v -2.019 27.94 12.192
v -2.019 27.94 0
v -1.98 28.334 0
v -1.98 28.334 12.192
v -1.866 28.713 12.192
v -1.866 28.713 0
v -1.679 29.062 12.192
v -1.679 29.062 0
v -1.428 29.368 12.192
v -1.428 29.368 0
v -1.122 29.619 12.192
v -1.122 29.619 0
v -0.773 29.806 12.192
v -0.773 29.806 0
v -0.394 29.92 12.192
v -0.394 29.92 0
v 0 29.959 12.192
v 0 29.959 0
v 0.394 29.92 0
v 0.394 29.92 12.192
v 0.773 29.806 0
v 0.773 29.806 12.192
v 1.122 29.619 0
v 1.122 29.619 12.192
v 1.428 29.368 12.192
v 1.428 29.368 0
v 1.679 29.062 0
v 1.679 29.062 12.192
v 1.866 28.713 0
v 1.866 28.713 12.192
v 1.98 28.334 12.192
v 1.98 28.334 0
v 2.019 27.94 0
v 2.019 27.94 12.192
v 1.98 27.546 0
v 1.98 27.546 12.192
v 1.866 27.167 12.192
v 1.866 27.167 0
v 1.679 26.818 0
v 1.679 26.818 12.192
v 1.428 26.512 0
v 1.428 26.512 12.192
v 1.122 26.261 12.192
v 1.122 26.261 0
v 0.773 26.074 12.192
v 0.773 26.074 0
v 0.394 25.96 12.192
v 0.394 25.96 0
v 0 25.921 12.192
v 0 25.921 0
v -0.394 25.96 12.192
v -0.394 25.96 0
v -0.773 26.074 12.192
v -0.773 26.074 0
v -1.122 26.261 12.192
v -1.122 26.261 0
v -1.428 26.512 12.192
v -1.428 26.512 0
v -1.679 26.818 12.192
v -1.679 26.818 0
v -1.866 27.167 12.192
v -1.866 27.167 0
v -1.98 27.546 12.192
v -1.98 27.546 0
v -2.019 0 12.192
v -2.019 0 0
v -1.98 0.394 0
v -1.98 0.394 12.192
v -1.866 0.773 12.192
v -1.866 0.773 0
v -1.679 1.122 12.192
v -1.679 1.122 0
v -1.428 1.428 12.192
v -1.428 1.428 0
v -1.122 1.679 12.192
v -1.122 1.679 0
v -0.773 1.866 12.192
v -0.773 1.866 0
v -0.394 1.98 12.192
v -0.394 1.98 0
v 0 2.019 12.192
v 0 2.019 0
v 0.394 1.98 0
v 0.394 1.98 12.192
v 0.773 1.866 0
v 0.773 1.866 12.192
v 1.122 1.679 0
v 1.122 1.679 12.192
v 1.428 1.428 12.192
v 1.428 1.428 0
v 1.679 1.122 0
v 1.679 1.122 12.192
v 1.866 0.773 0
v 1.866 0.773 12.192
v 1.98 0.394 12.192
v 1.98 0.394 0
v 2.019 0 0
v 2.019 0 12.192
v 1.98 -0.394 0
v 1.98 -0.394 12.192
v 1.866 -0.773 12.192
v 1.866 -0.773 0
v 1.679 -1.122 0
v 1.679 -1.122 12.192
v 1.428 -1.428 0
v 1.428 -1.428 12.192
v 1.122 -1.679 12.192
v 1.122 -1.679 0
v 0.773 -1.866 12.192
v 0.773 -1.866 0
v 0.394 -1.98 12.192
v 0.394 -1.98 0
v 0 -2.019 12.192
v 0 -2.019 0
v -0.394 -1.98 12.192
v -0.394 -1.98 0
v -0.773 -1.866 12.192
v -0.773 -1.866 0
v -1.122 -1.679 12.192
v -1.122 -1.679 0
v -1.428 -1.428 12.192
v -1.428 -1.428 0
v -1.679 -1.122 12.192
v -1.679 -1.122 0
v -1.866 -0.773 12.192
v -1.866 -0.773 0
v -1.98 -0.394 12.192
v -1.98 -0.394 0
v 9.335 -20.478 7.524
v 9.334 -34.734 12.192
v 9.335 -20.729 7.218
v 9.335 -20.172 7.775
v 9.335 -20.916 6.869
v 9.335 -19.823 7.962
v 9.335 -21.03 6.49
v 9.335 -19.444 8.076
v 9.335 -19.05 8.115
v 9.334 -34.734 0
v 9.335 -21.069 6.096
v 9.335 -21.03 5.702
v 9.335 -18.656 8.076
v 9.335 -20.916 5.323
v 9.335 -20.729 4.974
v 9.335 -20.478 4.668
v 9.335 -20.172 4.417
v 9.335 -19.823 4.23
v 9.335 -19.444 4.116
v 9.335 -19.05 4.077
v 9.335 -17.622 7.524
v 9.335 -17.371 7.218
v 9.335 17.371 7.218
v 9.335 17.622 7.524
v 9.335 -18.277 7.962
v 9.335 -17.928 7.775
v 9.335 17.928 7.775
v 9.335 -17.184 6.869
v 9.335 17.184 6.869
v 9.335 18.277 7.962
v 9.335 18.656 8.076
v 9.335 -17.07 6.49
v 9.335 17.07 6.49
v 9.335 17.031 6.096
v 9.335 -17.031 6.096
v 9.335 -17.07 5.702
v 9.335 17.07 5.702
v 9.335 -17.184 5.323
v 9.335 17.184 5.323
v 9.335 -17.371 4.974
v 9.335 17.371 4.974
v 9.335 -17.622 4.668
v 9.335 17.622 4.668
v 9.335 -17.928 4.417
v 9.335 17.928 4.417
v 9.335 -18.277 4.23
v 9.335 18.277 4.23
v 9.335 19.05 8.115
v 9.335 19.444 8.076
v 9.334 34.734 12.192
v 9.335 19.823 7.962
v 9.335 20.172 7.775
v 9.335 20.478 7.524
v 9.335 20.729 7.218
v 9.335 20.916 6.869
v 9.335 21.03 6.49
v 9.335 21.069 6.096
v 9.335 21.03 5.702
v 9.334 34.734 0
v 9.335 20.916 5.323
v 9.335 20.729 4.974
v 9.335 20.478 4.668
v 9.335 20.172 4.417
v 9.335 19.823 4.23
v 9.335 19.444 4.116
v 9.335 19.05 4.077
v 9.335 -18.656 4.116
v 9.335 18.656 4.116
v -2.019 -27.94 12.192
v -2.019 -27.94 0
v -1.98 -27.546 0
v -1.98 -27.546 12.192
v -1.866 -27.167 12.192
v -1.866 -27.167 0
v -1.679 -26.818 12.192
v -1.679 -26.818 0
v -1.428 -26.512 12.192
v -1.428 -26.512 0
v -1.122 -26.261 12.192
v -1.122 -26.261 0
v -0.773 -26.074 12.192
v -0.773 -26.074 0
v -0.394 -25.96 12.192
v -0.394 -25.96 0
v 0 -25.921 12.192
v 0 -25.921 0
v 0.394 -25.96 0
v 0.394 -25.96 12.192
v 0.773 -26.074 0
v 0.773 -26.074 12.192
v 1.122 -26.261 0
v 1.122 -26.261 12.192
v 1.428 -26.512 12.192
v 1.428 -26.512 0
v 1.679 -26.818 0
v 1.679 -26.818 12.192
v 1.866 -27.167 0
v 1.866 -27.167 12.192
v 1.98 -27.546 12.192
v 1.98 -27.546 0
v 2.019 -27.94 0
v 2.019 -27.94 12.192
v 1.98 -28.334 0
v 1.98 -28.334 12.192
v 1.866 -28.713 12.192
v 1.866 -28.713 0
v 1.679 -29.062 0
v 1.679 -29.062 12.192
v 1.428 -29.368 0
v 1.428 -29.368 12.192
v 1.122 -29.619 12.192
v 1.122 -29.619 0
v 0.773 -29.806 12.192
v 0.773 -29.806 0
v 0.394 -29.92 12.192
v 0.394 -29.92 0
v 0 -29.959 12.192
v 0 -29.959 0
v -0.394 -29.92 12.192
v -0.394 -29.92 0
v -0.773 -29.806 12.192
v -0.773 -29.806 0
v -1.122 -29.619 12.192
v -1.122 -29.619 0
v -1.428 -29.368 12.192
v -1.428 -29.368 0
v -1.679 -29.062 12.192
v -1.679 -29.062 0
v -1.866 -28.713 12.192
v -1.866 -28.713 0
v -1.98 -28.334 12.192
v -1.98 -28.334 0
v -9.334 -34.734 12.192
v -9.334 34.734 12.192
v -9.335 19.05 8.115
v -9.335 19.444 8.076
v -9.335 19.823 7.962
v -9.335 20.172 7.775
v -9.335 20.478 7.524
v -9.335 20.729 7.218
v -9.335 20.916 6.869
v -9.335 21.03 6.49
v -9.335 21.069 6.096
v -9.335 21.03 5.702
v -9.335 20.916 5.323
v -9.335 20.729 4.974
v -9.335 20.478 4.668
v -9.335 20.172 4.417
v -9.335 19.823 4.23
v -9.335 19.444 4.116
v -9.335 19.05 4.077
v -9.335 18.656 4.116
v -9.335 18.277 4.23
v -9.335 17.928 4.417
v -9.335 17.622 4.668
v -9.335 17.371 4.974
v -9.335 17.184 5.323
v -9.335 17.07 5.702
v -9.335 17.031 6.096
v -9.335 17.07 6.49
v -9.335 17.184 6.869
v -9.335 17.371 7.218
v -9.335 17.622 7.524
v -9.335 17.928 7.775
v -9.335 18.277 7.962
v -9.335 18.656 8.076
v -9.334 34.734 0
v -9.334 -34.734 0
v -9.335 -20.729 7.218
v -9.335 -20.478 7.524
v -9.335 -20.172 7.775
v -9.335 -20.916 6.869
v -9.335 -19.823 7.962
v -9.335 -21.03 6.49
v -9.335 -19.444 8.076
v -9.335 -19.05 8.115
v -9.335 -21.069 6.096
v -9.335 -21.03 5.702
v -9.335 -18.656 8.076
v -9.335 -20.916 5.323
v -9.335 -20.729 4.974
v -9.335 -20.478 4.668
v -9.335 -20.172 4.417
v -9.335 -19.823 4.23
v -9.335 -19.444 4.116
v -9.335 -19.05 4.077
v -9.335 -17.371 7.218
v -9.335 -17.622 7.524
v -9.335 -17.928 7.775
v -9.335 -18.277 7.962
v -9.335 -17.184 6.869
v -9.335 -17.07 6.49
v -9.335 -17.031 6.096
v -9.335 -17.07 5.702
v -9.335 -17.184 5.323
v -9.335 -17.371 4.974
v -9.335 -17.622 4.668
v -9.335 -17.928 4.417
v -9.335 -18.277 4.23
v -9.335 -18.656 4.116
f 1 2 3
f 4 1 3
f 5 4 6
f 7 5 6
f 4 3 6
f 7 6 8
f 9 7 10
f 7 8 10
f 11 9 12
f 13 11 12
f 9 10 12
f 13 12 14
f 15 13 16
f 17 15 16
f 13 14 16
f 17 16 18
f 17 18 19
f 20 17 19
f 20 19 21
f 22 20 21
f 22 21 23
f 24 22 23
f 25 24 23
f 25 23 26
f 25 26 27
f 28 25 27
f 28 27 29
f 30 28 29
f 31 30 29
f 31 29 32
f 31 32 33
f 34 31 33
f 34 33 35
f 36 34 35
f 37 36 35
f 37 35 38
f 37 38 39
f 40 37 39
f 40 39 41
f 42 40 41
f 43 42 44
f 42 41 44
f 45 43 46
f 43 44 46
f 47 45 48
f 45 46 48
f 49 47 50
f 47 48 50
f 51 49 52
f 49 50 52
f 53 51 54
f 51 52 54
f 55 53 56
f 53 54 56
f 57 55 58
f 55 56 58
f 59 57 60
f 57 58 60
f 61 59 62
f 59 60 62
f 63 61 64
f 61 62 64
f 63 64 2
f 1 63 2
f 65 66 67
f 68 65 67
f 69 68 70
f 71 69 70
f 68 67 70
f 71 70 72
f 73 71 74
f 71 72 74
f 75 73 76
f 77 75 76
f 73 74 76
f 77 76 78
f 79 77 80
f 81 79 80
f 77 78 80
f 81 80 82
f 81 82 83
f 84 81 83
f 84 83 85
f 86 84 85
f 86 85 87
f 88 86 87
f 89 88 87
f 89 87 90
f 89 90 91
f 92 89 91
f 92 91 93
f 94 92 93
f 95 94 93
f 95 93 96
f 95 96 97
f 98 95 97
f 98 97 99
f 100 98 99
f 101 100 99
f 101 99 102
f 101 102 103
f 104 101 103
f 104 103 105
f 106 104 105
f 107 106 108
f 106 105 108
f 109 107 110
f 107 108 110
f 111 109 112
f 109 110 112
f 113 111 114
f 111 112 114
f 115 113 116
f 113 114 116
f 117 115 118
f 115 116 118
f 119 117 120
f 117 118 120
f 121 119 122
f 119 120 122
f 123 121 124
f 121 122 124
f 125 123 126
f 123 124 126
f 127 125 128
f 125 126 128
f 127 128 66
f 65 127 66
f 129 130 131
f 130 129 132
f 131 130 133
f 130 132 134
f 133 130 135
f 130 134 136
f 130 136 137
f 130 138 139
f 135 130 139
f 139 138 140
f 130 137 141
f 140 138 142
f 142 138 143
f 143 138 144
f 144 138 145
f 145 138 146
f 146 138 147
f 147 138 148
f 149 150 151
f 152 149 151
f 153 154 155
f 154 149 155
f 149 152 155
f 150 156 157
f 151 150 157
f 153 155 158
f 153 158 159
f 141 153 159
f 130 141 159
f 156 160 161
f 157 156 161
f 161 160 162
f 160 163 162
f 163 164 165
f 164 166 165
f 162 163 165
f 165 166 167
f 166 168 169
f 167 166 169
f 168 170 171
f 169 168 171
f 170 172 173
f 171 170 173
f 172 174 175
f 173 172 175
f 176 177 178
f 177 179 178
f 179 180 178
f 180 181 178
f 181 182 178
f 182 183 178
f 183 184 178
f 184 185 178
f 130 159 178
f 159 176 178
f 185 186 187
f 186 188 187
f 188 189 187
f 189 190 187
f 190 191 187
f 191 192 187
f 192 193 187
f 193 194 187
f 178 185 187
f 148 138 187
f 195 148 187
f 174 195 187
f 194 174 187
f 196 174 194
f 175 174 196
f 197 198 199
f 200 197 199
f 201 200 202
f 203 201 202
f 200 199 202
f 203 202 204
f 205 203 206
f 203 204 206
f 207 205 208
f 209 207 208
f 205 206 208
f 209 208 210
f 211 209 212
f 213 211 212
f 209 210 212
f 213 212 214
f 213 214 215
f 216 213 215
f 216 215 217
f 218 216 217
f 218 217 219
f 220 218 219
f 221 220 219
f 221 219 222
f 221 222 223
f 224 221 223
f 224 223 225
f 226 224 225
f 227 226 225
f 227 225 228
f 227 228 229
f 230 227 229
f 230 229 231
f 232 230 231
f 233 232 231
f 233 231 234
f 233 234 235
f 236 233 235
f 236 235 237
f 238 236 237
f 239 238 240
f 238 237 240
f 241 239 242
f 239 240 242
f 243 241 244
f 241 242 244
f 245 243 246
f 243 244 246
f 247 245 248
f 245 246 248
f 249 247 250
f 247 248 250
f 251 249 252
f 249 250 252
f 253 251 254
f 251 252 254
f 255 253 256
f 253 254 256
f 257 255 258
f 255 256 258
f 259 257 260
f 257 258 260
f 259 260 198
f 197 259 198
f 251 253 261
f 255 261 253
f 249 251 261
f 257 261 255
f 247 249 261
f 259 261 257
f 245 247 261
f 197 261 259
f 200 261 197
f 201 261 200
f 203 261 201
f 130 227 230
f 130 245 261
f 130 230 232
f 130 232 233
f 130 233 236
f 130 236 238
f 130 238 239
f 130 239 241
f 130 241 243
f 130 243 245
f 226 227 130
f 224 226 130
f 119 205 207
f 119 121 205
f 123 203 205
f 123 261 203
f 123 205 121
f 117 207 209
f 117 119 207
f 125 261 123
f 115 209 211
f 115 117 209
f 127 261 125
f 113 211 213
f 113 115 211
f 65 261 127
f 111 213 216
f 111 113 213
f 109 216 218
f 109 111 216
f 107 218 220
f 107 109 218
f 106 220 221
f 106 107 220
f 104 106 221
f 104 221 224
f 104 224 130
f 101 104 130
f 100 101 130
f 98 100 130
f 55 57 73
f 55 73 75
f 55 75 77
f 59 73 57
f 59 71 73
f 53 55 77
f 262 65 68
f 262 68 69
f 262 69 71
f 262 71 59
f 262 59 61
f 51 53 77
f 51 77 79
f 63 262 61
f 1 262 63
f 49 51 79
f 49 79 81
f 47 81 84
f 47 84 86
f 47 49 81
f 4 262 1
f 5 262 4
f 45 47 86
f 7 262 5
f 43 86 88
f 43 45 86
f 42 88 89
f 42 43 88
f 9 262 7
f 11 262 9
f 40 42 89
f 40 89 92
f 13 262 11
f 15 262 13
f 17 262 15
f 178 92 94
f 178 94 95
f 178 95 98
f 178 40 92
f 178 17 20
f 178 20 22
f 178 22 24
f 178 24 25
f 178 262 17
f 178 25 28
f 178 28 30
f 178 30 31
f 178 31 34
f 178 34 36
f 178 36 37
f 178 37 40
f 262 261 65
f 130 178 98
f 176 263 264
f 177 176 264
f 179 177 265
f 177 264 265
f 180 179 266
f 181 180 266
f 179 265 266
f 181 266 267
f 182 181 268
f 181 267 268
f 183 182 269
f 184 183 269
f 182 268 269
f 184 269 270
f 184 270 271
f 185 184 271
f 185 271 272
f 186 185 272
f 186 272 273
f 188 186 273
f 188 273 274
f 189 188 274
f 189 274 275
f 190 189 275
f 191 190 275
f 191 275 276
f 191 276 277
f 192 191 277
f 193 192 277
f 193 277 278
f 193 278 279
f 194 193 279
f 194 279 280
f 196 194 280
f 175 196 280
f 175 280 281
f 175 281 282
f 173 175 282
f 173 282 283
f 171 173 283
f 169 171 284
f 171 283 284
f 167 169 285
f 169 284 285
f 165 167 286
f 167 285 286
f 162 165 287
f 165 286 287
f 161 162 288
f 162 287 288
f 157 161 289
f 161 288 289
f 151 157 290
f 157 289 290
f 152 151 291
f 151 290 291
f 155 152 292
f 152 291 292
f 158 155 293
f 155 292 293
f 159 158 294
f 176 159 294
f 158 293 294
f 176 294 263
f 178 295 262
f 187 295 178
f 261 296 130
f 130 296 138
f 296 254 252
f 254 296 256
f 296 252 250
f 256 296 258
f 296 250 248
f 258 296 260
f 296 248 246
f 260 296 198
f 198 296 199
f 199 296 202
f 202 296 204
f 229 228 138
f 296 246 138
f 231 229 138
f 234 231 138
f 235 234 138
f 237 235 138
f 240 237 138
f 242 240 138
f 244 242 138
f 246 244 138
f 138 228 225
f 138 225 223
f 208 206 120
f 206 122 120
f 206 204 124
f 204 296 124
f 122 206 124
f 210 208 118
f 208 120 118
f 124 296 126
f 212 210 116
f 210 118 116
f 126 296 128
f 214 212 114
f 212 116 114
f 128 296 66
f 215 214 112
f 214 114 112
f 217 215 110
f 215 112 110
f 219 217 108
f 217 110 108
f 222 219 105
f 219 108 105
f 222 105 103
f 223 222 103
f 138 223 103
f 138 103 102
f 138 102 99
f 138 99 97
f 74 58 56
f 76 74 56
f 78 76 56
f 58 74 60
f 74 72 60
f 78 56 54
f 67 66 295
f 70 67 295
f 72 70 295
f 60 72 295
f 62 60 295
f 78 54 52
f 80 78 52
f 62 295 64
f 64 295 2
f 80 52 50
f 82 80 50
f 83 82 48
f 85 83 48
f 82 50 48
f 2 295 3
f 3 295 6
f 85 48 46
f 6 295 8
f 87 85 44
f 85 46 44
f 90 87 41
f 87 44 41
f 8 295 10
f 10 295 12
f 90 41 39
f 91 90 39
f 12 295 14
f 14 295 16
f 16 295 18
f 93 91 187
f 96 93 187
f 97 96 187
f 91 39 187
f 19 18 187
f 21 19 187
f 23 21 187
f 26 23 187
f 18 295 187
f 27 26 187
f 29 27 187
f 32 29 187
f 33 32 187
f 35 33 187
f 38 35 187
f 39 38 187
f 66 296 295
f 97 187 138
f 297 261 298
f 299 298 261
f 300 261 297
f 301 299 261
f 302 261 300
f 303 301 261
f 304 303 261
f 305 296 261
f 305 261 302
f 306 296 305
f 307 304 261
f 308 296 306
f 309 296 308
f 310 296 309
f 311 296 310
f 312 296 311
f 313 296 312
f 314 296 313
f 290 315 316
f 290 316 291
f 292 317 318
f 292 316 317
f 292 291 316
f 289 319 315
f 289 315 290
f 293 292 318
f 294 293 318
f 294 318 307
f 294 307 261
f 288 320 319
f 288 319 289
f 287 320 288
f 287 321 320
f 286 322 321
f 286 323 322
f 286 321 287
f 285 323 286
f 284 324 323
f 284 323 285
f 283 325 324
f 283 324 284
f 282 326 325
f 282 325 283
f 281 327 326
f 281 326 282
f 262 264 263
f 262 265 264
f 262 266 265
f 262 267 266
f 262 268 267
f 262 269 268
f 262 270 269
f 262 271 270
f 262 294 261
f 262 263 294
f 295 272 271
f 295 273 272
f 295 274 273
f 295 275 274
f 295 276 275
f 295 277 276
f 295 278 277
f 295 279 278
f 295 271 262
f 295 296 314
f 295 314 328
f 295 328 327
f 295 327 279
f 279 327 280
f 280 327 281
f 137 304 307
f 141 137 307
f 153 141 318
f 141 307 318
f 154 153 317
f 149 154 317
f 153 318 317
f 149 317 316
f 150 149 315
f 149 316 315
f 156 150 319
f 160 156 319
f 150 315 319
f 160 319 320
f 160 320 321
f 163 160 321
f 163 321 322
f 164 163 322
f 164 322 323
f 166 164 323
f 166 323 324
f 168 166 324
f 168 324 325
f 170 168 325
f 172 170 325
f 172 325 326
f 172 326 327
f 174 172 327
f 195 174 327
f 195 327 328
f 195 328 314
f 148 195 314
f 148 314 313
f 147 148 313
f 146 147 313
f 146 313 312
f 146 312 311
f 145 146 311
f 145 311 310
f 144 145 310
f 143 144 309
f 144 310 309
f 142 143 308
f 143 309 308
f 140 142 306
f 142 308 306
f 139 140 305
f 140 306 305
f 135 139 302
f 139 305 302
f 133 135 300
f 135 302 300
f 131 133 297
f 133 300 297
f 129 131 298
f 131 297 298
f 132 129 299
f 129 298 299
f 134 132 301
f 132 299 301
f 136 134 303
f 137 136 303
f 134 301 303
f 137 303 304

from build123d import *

# Parameters (mm, degrees)
SKETCH1_W                  = 18.669
SKETCH1_H                  = 69.469
BOSS_EXTRUDE1_DEPTH        = 12.192
TAP_DRILL_FOR_10_32_TAP1_D = 4.0386
TAP_DRILL_FOR_10_32_TAP2_D = 4.0386


with BuildPart() as part:
    # Sketch1 → Boss-Extrude1 (new body)
    with BuildSketch(Plane.XY):
        Rectangle(SKETCH1_W, SKETCH1_H)
    extrude(amount=BOSS_EXTRUDE1_DEPTH)

    # Tap Drill for #10-32 Tap1 (through all)
    with Locations(Plane(origin=(9.3345, 0, 0), x_dir=(0, 0, -1), z_dir=(1, 0, 0))):
        with Locations((-6.096, 19.05), (-6.096, -19.05)):
            Hole(TAP_DRILL_FOR_10_32_TAP1_D / 2)

    # Tap Drill for #10-32 Tap2 (through all)
    with Locations(Plane.XY.offset(12.192)):
        with Locations((0, 27.94), (0, -27.94), (0, 0)):
            Hole(TAP_DRILL_FOR_10_32_TAP2_D / 2)


solid = part.part
